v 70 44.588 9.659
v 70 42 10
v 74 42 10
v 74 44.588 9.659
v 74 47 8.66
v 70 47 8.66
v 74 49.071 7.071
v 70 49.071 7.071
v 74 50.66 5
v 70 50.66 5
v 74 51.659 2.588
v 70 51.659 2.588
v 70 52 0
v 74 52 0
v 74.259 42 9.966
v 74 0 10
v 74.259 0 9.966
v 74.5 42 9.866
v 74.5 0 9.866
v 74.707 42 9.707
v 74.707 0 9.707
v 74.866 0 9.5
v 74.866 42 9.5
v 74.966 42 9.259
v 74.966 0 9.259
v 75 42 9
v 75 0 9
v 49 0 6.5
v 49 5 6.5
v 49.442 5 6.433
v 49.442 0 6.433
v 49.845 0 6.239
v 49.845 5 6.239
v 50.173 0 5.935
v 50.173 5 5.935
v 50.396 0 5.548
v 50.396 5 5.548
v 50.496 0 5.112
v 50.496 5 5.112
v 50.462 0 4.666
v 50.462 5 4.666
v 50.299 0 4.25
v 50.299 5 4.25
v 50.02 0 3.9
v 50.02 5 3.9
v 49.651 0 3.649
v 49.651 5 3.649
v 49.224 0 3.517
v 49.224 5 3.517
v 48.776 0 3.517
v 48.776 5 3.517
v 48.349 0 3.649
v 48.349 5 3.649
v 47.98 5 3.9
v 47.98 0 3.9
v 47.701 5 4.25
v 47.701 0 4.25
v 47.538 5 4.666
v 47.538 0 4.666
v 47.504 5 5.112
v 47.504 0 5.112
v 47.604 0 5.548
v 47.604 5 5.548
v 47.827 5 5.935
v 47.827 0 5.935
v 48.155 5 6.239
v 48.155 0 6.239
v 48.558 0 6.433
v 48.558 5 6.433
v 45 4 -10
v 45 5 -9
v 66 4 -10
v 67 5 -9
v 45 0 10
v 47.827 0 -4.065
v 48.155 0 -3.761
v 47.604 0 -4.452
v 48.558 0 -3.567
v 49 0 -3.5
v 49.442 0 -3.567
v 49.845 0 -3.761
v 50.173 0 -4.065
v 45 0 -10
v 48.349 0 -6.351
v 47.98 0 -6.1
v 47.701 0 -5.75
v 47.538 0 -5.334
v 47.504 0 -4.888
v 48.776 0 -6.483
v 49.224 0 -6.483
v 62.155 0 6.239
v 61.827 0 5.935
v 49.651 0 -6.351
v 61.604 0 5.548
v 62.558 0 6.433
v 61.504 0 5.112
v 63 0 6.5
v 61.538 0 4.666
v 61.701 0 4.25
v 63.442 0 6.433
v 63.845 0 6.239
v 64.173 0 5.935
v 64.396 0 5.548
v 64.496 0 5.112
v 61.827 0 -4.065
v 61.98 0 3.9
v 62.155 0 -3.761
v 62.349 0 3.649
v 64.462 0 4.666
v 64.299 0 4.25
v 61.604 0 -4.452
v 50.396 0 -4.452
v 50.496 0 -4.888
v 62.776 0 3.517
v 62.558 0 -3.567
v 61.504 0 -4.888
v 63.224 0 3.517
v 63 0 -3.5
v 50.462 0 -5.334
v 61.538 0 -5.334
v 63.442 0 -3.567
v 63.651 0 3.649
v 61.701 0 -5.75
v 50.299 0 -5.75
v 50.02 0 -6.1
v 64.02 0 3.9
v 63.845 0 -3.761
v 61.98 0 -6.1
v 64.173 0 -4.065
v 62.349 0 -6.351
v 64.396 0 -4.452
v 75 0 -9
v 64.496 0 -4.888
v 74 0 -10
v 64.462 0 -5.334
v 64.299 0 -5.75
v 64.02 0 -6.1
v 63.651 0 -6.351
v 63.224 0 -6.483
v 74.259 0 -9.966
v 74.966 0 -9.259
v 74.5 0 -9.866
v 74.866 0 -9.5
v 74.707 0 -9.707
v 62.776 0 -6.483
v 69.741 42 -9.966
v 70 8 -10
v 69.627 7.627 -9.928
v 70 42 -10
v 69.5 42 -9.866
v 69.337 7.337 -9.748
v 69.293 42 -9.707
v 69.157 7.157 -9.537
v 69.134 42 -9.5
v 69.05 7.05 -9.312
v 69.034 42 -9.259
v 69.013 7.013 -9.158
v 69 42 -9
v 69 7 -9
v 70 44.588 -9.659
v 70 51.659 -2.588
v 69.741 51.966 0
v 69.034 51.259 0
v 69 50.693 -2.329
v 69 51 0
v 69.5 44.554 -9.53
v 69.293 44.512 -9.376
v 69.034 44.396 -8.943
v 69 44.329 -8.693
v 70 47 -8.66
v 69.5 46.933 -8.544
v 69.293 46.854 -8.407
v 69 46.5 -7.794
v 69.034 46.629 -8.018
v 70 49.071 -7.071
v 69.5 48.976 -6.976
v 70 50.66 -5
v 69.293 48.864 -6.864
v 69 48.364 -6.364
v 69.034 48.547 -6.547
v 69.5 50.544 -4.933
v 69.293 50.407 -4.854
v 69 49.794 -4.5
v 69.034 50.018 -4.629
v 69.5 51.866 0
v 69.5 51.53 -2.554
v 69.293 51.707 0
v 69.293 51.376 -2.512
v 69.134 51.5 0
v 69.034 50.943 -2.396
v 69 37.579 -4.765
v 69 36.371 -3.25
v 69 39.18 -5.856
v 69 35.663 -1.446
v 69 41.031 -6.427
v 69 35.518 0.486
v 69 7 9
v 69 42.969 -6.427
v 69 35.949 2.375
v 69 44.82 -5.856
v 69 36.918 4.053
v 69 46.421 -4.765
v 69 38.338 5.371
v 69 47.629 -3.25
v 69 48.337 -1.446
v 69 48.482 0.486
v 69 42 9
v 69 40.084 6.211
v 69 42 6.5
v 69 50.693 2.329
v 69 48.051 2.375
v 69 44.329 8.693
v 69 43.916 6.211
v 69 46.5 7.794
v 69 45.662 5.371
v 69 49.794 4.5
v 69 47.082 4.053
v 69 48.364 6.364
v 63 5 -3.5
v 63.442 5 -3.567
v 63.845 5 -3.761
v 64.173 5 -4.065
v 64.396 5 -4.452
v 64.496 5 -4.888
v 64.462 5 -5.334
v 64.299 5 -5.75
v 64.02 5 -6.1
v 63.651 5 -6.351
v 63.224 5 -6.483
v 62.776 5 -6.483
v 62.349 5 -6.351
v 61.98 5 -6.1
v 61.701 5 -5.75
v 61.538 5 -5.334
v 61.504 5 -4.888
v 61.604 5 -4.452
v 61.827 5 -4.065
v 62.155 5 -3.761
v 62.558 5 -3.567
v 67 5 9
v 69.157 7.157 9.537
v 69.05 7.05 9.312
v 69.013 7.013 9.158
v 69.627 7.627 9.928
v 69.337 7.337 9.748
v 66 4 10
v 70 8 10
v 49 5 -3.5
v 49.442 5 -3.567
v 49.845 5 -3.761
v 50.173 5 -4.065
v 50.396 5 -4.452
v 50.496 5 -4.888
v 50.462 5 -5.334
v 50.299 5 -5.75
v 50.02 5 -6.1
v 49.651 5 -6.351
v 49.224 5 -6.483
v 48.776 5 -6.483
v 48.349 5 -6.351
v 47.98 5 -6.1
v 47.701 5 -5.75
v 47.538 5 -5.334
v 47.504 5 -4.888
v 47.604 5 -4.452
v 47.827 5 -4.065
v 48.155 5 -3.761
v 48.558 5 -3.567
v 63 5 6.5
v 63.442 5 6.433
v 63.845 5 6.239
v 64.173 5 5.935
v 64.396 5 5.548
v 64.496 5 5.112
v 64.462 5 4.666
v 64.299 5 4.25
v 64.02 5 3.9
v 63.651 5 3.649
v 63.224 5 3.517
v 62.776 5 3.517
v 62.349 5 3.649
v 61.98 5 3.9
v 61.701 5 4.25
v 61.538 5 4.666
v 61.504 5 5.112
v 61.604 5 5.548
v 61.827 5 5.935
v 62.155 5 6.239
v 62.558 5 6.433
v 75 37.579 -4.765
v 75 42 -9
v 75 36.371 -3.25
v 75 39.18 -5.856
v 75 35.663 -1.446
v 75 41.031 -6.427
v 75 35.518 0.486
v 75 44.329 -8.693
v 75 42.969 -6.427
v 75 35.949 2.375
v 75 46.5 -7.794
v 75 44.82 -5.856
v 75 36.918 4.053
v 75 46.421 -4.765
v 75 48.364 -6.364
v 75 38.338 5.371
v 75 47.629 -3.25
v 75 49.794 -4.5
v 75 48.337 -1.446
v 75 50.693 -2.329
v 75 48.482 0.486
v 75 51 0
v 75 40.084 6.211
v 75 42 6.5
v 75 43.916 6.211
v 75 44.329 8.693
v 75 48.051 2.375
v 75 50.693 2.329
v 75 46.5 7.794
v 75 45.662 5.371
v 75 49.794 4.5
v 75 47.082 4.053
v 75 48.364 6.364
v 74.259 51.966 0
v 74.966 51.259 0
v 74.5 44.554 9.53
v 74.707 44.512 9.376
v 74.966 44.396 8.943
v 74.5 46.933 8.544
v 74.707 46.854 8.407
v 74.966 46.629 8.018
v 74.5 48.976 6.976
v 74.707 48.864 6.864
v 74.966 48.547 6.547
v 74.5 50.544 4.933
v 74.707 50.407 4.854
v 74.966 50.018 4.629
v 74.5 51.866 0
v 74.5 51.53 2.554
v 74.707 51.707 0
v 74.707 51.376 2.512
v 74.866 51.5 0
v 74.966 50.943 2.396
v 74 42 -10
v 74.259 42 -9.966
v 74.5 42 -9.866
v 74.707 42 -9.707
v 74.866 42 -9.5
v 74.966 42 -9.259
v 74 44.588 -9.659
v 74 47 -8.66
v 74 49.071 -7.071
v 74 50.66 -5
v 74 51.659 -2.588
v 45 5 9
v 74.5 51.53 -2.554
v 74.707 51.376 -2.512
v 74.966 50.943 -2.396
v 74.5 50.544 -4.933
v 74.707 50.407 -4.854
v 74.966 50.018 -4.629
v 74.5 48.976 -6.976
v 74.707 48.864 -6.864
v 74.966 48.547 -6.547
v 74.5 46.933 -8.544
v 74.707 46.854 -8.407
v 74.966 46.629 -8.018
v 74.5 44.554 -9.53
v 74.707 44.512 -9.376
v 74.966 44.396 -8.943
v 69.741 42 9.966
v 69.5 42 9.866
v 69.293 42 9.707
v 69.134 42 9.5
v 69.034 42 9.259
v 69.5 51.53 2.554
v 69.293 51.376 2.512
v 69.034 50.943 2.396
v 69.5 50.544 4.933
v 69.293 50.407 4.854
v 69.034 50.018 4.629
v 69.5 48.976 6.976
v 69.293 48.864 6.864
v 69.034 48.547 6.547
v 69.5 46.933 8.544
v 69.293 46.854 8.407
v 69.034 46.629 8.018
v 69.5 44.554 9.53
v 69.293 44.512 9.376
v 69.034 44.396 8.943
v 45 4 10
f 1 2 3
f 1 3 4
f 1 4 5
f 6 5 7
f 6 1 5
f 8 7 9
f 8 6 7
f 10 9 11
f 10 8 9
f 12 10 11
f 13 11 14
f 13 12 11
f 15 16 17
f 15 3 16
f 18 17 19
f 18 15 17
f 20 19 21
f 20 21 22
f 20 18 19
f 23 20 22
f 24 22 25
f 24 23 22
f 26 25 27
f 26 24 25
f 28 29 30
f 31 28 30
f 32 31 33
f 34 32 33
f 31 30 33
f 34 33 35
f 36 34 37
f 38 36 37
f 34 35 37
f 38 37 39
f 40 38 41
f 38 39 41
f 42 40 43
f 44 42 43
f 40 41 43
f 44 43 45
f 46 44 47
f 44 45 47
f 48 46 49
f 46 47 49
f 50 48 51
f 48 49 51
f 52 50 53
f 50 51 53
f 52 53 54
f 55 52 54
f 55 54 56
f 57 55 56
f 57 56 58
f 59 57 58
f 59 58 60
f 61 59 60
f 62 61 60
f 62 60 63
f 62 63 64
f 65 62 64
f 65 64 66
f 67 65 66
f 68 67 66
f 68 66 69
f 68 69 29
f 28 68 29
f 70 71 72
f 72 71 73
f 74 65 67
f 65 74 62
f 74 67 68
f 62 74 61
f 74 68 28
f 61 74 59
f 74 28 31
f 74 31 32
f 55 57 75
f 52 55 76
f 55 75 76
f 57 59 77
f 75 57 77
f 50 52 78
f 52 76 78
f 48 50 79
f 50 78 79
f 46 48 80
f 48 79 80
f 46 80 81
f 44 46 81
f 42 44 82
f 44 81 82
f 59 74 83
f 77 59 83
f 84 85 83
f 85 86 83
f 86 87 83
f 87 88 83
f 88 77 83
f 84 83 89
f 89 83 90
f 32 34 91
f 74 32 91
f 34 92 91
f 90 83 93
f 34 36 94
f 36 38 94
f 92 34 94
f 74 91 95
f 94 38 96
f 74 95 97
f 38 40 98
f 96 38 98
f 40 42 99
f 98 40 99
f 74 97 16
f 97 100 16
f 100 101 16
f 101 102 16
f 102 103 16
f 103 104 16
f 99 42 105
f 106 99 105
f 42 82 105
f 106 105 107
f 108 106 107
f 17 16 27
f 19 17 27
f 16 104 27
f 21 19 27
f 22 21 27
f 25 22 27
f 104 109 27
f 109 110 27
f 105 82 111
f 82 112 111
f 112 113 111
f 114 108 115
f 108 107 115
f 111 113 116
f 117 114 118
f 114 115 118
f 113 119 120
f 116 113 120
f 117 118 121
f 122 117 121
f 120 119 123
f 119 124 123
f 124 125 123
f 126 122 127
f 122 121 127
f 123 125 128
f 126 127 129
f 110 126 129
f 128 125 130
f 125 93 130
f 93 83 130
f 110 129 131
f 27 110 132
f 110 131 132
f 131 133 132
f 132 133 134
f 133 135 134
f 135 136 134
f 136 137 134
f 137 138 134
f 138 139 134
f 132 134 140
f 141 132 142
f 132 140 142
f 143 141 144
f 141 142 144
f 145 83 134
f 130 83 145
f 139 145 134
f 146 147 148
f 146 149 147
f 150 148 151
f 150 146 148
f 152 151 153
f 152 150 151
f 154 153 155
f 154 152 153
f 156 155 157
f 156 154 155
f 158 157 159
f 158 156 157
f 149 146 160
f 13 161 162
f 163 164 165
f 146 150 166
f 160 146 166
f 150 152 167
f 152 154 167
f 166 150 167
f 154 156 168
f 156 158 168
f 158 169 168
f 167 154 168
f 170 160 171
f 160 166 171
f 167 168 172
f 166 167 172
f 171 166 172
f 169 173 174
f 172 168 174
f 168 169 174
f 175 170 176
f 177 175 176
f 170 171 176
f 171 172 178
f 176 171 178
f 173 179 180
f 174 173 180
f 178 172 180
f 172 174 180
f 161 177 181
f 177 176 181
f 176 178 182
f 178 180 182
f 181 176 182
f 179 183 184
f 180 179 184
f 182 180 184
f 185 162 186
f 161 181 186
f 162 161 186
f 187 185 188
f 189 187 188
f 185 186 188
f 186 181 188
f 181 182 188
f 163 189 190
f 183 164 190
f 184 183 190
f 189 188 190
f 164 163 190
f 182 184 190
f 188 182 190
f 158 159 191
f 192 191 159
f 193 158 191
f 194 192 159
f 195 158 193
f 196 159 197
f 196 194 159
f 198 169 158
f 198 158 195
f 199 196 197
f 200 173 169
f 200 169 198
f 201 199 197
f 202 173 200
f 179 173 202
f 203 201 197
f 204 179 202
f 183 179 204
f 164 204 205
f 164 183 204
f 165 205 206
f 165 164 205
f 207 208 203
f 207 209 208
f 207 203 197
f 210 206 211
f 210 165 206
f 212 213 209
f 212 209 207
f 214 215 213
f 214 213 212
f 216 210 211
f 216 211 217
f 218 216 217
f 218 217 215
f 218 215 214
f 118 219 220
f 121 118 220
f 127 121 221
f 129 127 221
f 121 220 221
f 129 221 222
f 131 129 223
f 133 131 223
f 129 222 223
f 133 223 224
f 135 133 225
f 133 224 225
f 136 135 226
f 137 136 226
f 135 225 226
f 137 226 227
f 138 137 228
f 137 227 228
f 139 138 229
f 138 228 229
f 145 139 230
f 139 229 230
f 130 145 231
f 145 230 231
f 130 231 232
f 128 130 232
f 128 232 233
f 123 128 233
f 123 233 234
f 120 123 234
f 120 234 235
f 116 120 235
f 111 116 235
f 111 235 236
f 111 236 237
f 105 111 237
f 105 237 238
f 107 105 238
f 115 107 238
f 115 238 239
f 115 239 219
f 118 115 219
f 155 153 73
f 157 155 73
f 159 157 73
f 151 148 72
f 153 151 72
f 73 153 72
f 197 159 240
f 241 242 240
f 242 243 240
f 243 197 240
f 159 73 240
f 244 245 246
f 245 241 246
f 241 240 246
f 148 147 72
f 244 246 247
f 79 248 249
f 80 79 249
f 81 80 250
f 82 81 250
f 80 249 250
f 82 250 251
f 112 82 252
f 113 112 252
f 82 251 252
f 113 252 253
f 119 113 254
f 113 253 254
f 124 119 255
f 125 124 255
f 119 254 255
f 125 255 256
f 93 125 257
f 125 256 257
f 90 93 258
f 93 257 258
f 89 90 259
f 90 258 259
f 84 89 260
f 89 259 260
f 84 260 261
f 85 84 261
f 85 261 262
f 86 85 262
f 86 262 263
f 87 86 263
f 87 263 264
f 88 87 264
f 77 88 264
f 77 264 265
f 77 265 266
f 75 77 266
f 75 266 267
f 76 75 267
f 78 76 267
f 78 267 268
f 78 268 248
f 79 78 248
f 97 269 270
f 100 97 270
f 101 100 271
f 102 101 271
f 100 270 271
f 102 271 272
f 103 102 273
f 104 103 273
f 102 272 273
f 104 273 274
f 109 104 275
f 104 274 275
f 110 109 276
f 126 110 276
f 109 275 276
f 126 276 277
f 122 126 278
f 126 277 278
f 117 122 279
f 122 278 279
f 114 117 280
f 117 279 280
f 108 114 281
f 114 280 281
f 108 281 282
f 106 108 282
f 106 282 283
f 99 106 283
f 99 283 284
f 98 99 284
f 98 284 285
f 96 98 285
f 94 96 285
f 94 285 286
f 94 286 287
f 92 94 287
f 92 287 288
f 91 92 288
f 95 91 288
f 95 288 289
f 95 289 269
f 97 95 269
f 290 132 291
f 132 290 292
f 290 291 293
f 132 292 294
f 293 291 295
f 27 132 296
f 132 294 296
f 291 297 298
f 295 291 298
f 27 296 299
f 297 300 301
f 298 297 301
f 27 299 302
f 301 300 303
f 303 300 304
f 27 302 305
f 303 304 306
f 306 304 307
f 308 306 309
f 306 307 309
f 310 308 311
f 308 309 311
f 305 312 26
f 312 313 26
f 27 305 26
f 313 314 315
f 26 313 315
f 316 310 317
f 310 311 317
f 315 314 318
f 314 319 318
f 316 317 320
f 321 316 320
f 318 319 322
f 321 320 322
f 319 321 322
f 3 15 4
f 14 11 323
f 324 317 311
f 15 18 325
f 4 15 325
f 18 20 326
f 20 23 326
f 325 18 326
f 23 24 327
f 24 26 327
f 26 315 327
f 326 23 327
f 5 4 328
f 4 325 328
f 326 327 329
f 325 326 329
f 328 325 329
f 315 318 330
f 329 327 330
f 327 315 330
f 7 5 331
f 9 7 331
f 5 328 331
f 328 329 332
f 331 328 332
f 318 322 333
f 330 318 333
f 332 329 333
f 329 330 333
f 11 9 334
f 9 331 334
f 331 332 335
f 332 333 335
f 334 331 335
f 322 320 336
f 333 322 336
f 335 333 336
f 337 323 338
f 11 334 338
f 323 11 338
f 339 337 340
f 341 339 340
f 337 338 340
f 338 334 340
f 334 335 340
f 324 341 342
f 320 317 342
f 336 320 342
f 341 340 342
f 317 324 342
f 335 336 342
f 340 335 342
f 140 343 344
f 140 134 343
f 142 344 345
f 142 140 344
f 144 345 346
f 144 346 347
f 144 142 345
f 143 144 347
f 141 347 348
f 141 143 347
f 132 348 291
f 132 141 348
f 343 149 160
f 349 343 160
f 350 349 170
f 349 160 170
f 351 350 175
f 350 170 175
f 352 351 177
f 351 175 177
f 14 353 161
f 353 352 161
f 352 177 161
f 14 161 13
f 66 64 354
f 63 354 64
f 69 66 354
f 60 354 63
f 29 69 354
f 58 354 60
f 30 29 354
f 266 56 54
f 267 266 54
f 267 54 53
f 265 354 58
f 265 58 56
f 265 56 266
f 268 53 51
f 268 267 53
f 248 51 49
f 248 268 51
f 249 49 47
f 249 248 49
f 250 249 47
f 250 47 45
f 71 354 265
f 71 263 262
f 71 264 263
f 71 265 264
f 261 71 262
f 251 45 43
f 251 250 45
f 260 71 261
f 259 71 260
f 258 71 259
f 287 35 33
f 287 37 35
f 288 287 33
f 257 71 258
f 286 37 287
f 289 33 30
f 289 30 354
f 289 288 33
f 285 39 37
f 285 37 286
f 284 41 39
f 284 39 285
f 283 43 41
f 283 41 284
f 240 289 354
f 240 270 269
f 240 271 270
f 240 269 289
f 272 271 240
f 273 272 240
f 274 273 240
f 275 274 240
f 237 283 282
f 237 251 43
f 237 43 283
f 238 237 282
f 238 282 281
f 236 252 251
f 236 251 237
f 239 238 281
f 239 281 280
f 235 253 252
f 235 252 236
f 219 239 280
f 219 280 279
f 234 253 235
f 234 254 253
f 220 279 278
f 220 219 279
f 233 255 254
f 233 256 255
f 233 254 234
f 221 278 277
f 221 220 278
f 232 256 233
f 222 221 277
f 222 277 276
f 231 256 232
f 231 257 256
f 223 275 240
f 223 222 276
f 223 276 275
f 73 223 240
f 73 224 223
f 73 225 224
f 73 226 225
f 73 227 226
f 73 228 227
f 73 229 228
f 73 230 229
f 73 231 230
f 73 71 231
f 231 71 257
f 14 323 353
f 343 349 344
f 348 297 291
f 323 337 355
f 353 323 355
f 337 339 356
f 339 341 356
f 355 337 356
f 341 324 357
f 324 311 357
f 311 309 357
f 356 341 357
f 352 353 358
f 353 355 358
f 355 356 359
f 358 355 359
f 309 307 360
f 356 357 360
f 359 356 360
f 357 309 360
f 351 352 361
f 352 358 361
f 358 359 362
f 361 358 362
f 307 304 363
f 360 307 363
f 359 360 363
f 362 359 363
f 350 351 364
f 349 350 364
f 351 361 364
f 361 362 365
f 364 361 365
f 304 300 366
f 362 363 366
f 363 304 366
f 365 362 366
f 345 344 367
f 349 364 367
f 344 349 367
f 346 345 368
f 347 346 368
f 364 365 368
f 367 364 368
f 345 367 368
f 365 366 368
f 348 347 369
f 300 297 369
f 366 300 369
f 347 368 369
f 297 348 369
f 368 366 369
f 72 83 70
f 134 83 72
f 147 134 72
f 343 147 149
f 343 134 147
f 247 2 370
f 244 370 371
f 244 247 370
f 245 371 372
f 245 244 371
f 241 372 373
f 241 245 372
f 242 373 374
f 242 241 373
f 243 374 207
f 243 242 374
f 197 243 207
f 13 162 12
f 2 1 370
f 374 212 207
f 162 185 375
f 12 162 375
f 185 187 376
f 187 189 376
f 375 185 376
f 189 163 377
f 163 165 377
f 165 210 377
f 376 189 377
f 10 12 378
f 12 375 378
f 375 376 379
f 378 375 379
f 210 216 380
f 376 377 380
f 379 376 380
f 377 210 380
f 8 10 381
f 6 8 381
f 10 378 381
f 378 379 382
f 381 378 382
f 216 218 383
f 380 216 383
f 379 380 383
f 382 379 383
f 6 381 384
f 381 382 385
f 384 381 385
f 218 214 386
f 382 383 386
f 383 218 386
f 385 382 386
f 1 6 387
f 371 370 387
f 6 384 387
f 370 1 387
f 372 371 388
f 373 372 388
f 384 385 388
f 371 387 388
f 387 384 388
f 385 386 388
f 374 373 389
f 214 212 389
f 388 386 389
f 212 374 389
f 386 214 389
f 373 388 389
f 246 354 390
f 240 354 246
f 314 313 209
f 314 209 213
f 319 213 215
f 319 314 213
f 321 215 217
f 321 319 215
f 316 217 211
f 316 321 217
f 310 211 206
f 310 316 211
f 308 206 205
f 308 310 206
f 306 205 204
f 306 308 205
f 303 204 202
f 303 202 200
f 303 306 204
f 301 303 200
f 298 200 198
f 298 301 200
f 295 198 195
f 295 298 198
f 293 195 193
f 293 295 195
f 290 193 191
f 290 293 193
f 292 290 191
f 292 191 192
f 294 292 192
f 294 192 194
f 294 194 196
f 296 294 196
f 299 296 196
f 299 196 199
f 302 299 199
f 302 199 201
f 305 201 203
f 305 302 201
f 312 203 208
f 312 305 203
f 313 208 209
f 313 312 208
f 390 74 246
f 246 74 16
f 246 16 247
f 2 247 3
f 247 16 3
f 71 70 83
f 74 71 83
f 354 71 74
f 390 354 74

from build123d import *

# Parameters (mm, degrees)
SKETCH1_W            = 150
SKETCH1_H            = 20
BOSS_EXTRUDE1_DEPTH  = 5
SKETCH2_W            = 20
SKETCH2_H            = 47
SKETCH2_R            = 6.5
BOSS_EXTRUDE2_DEPTH  = 6
FILLET1_R            = 10
FILLET1_OF_MIRROR1_R = 10
CHAMFER1_SIZE        = 2
FILLET2_R            = 1
CHAMFER2_SIZE        = 1
SKETCH3_W            = 35.580310247
SKETCH3_H            = 66.117820845
CUT_EXTRUDE1_DEPTH   = 120
SKETCH4_R            = 1.5
CUT_EXTRUDE2_DEPTH   = 10


with BuildPart() as part:
    # Sketch1 → Boss-Extrude1 (new body)
    with BuildSketch(Plane(origin=(0, 0, 0), x_dir=(1, 0, 0), z_dir=(0, 1, 0))):
        Rectangle(SKETCH1_W, SKETCH1_H)
    extrude(amount=BOSS_EXTRUDE1_DEPTH)

    # Sketch2 → Boss-Extrude2 (add)
    with BuildSketch(Plane.ZY.offset(75)):
        with Locations((0, 28.5)):
            Rectangle(SKETCH2_W, SKETCH2_H)
        with Locations((0, 42)):
            Circle(SKETCH2_R, mode=Mode.SUBTRACT)
    boss_extrude2 = extrude(amount=-BOSS_EXTRUDE2_DEPTH)

    # Fillet1
    fillet1_edges = [part.edges().sort_by_distance(p)[0] for p in [
        (-72, 52, -10),
        (-72, 52, 10),
    ]]
    fillet(fillet1_edges, radius=FILLET1_R - 0.0001)  # a hair under: the kernel refuses the full size

    # Mirror1: Boss-Extrude2 across plane
    add(boss_extrude2.mirror(Plane(origin=(0, 0, 0), x_dir=(0, 0, 1), z_dir=(1, 0, 0))))

    # Fillet1 of Mirror1
    fillet1_of_mirror1_edges = [part.edges().sort_by_distance(p)[0] for p in [
        (72, 52, -10),
        (72, 52, 10),
    ]]
    fillet(fillet1_of_mirror1_edges, radius=FILLET1_OF_MIRROR1_R - 0.0001)  # a hair under: the kernel refuses the full size

    # Chamfer1
    chamfer1_edges = [part.edges().sort_by_distance(p)[0] for p in [
        (-69, 5, 0),
        (69, 5, 0),
    ]]
    chamfer(chamfer1_edges, length=CHAMFER1_SIZE)

    # Fillet2
    fillet2_edges = [part.edges().sort_by_distance(p)[0] for p in [
        (-75, 21.00005, 10),
        (-75, 21.00005, -10),
        (-75, 49.071097101, 7.071097101),
        (-75, 49.071097101, -7.071097101),
        (-69, 24.50005, -10),
        (-69, 49.071097101, 7.071097101),
        (-69, 49.071097101, -7.071097101),
        (69, 24.50005, -10),
        (75, 21.00005, -10),
        (75, 21.00005, 10),
        (75, 49.071097101, 7.071097101),
        (75, 49.071097101, -7.071097101),
        (69, 49.071097101, 7.071097101),
        (69, 49.071097101, -7.071097101),
        (-69, 24.50005, 10),
        (69, 24.50005, 10),
    ]]
    fillet(fillet2_edges, radius=FILLET2_R)

    # Chamfer2
    chamfer2_edges = [part.edges().sort_by_distance(p)[0] for p in [
        (0, 5, -10),
        (0, 5, 10),
    ]]
    chamfer(chamfer2_edges, length=CHAMFER2_SIZE)

    # Sketch3 → Cut-Extrude1 (cut)
    with BuildSketch(Plane.ZY.offset(75)):
        with Locations((0.077756878, 33.058910422)):
            Rectangle(SKETCH3_W, SKETCH3_H)
    extrude(amount=-CUT_EXTRUDE1_DEPTH, mode=Mode.SUBTRACT)

    # Sketch4 → Cut-Extrude2 (cut)
    with BuildSketch(Plane(origin=(0, 5, 0), x_dir=(1, 0, 0), z_dir=(0, 1, 0))):
        with Locations(Location((49, 5, 0), (0, 0, 270))):
            Circle(SKETCH4_R)
        with Locations(Location((49, -5, 0), (0, 0, 270))):
            Circle(SKETCH4_R)
        with Locations(Location((63, -5, 0), (0, 0, 270))):
            Circle(SKETCH4_R)
        with Locations(Location((63, 5, 0), (0, 0, 270))):
            Circle(SKETCH4_R)
    extrude(amount=-CUT_EXTRUDE2_DEPTH, mode=Mode.SUBTRACT)


solid = part.part
